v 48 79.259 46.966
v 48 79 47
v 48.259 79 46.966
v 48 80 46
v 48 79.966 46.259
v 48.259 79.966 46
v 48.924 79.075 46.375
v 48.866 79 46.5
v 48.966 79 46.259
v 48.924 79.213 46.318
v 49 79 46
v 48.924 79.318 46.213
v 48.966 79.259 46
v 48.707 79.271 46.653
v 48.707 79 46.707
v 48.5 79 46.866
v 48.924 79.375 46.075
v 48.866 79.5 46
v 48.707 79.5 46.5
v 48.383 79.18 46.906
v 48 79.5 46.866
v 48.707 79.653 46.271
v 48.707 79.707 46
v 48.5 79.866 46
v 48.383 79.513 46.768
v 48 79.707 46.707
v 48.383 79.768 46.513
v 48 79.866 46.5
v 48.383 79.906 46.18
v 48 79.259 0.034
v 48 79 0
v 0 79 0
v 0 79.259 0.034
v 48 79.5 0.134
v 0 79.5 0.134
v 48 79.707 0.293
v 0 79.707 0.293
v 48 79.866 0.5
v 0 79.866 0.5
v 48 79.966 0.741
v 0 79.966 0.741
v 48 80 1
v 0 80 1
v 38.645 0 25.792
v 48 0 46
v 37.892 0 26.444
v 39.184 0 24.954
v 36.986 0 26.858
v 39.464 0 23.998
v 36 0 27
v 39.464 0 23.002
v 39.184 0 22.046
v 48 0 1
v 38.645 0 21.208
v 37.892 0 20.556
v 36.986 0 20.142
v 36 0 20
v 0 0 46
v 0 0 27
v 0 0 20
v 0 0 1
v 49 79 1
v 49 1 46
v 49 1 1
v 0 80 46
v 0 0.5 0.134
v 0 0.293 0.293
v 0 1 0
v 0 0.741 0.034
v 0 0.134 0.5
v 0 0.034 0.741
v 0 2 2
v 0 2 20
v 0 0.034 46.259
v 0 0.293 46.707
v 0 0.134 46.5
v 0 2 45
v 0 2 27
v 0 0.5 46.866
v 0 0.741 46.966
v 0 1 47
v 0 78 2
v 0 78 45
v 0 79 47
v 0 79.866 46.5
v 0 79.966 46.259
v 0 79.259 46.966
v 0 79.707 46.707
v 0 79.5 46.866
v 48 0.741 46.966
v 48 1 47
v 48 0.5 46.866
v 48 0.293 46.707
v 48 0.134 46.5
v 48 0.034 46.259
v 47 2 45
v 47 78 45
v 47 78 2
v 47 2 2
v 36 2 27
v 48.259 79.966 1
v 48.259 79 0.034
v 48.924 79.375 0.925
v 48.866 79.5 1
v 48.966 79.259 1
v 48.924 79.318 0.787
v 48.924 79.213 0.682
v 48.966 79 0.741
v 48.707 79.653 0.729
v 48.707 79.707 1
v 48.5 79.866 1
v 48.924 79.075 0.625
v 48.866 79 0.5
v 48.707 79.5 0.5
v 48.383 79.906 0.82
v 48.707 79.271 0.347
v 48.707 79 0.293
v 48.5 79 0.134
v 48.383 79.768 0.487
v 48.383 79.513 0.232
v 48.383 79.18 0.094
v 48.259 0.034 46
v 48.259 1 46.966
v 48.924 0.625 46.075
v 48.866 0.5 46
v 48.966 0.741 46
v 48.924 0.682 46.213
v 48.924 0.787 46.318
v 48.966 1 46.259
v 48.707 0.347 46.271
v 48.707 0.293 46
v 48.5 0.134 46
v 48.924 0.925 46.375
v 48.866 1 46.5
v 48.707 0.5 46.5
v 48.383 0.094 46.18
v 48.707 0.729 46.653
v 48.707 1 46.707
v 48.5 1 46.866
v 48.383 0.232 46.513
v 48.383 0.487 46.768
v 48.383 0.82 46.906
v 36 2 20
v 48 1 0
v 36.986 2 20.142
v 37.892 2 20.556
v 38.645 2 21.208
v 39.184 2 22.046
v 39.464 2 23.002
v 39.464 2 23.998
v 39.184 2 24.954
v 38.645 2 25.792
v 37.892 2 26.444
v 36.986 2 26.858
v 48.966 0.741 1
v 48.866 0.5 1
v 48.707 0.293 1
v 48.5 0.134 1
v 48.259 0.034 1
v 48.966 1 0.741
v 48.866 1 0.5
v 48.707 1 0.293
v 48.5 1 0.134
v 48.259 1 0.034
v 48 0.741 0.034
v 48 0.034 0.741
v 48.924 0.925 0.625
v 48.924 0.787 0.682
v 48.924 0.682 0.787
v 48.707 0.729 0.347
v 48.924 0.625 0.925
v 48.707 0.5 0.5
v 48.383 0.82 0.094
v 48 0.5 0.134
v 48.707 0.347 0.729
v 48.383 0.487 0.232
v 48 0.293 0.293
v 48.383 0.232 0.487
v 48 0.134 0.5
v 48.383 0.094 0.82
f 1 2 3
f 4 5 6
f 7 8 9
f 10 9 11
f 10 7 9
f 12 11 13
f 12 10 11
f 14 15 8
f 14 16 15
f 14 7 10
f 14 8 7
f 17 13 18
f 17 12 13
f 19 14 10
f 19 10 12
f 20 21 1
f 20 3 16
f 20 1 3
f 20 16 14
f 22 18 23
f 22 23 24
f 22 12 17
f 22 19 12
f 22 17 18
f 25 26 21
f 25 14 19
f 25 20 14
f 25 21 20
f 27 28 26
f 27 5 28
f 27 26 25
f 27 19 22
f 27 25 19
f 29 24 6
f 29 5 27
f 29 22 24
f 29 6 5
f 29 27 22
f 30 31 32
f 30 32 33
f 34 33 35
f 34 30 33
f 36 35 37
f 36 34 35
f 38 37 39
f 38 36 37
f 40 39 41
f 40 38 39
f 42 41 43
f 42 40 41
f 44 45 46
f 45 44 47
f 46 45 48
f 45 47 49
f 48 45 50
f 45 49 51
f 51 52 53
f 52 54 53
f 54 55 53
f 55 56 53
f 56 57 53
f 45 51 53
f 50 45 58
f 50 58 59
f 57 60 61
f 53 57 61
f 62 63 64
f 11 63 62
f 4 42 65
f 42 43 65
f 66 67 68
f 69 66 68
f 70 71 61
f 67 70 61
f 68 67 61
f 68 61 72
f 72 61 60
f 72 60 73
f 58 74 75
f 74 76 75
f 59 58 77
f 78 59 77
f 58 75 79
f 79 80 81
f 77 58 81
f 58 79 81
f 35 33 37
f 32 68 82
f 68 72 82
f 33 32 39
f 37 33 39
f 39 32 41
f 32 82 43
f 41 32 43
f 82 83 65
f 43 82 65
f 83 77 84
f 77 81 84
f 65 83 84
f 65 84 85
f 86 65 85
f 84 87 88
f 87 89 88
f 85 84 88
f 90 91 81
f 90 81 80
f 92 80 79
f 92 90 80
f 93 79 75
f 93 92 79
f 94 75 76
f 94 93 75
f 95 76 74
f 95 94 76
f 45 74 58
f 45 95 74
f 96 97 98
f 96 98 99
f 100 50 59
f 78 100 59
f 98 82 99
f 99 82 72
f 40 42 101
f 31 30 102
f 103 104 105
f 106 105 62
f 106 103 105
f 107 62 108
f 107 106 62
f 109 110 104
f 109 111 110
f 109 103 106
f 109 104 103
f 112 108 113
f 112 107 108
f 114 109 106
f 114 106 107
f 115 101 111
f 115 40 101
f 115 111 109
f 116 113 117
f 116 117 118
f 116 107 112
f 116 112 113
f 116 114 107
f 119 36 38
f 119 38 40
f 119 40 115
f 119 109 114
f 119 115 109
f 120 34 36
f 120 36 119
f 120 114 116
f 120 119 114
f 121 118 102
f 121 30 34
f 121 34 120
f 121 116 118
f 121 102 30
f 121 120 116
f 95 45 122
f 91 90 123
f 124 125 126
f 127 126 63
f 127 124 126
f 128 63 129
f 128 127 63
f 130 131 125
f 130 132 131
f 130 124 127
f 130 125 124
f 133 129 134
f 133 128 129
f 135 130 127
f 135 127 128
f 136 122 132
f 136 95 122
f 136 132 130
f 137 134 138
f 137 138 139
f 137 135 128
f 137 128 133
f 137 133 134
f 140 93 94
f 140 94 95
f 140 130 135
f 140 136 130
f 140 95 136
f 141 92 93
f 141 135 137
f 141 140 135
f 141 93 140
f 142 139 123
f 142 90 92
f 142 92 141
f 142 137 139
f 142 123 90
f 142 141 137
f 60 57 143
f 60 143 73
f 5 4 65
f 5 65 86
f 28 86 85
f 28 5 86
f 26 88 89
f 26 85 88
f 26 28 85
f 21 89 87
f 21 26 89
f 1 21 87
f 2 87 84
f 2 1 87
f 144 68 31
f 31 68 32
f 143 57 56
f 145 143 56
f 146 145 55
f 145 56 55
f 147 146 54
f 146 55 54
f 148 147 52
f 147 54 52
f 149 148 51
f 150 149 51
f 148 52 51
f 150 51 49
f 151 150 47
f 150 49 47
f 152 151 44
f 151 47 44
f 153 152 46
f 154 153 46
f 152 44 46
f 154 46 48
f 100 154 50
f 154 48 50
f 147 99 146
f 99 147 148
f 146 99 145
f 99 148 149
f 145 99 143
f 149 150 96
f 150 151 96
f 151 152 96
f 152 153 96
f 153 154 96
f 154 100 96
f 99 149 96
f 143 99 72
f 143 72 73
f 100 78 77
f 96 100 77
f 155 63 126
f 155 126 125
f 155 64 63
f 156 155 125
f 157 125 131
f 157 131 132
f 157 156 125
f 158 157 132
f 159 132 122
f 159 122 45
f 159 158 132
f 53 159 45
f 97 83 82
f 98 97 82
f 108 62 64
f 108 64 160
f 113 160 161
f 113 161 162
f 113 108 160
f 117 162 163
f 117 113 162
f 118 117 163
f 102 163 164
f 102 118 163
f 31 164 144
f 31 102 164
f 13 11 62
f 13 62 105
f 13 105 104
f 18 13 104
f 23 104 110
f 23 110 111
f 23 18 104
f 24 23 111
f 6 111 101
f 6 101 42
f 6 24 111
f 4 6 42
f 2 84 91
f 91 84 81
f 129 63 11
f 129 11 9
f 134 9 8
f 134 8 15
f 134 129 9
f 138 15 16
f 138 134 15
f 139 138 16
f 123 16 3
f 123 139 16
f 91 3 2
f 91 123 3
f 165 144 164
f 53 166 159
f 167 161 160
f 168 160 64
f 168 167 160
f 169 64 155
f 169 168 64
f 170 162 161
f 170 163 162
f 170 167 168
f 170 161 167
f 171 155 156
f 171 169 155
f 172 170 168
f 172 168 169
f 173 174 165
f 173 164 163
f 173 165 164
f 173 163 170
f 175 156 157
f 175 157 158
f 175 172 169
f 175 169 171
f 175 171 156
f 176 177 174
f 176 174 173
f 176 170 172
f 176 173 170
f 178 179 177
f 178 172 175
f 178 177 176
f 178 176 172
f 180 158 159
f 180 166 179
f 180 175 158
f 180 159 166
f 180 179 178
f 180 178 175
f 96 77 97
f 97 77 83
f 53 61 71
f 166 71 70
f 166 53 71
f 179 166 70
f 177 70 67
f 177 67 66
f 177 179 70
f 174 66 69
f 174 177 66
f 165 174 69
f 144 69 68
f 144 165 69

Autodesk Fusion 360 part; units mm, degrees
sketch "Sketch1" plane through (0, 0, 0) normal (1, 0, 0) x (0, 1, 0) in component "Box"
  line L0 (0, 0) -> (80, 0)
  line L1 (80, 0) -> (80, 47)
  line L2 (80, 47) -> (0, 47)
  line L3 (0, 47) -> (0, 0)
  dimension "d1" = 80
  dimension "d2" = 47
extrude "Extrude1" add sketch "Sketch1" along normal blind 49 in component "Box"
sketch "Sketch2" plane through (0, 0, 0) normal (-1, 0, 0) x (0, -1, 0) in component "Box"
  line L0 (0, 0) -> (0, 47)
  line L1 (0, 47) -> (-80, 47)
  line L2 (-80, 47) -> (-80, 0)
  line L3 (-80, 0) -> (0, 0)
  line L4 (-78, 2) -> (-2, 2)
  line L5 (-2, 2) -> (-2, 45)
  line L6 (-2, 45) -> (-78, 45)
  line L7 (-78, 45) -> (-78, 2)
  dimension "d5" = -2
extrude "Extrude2" cut sketch "Sketch2" against normal blind 47 contours L4 L5 L6 L7 in component "Box"
sketch "Sketch3" plane through (0, 0, 0) normal (0, 1, 0) x (1, 0, 0) in component "Box"
  circle A0 centre (36, -23.5) radius 3.5
  line L0 (0, -47) -> (0, 0)
  line L1 (0, 0) -> (49, 0)
  line L2 (36, -20) -> (0, -20)
  line L3 (36, -27) -> (0, -27)
  dimension "d8" = 7
  dimension "d12" = 36
  dimension "d13" = 23.5
extrude "Extrude3" cut sketch "Sketch3" along normal up to surface (2 mm away) in component "Box"
fillet "Fillet1" radius 1 8 edges at (24.5, 0, 47) (24.5, 80, 47) (24.5, 80, 0) (24.5, 0, 0) (49, 40, 47) (49, 40, 0) (49, 0, 23.5) (49, 80, 23.5) in component "Box"
component "Box" placed x (1, 0, 0) y (0, 1, 0) z (0, 0, 1) at (0, 0, 0)
